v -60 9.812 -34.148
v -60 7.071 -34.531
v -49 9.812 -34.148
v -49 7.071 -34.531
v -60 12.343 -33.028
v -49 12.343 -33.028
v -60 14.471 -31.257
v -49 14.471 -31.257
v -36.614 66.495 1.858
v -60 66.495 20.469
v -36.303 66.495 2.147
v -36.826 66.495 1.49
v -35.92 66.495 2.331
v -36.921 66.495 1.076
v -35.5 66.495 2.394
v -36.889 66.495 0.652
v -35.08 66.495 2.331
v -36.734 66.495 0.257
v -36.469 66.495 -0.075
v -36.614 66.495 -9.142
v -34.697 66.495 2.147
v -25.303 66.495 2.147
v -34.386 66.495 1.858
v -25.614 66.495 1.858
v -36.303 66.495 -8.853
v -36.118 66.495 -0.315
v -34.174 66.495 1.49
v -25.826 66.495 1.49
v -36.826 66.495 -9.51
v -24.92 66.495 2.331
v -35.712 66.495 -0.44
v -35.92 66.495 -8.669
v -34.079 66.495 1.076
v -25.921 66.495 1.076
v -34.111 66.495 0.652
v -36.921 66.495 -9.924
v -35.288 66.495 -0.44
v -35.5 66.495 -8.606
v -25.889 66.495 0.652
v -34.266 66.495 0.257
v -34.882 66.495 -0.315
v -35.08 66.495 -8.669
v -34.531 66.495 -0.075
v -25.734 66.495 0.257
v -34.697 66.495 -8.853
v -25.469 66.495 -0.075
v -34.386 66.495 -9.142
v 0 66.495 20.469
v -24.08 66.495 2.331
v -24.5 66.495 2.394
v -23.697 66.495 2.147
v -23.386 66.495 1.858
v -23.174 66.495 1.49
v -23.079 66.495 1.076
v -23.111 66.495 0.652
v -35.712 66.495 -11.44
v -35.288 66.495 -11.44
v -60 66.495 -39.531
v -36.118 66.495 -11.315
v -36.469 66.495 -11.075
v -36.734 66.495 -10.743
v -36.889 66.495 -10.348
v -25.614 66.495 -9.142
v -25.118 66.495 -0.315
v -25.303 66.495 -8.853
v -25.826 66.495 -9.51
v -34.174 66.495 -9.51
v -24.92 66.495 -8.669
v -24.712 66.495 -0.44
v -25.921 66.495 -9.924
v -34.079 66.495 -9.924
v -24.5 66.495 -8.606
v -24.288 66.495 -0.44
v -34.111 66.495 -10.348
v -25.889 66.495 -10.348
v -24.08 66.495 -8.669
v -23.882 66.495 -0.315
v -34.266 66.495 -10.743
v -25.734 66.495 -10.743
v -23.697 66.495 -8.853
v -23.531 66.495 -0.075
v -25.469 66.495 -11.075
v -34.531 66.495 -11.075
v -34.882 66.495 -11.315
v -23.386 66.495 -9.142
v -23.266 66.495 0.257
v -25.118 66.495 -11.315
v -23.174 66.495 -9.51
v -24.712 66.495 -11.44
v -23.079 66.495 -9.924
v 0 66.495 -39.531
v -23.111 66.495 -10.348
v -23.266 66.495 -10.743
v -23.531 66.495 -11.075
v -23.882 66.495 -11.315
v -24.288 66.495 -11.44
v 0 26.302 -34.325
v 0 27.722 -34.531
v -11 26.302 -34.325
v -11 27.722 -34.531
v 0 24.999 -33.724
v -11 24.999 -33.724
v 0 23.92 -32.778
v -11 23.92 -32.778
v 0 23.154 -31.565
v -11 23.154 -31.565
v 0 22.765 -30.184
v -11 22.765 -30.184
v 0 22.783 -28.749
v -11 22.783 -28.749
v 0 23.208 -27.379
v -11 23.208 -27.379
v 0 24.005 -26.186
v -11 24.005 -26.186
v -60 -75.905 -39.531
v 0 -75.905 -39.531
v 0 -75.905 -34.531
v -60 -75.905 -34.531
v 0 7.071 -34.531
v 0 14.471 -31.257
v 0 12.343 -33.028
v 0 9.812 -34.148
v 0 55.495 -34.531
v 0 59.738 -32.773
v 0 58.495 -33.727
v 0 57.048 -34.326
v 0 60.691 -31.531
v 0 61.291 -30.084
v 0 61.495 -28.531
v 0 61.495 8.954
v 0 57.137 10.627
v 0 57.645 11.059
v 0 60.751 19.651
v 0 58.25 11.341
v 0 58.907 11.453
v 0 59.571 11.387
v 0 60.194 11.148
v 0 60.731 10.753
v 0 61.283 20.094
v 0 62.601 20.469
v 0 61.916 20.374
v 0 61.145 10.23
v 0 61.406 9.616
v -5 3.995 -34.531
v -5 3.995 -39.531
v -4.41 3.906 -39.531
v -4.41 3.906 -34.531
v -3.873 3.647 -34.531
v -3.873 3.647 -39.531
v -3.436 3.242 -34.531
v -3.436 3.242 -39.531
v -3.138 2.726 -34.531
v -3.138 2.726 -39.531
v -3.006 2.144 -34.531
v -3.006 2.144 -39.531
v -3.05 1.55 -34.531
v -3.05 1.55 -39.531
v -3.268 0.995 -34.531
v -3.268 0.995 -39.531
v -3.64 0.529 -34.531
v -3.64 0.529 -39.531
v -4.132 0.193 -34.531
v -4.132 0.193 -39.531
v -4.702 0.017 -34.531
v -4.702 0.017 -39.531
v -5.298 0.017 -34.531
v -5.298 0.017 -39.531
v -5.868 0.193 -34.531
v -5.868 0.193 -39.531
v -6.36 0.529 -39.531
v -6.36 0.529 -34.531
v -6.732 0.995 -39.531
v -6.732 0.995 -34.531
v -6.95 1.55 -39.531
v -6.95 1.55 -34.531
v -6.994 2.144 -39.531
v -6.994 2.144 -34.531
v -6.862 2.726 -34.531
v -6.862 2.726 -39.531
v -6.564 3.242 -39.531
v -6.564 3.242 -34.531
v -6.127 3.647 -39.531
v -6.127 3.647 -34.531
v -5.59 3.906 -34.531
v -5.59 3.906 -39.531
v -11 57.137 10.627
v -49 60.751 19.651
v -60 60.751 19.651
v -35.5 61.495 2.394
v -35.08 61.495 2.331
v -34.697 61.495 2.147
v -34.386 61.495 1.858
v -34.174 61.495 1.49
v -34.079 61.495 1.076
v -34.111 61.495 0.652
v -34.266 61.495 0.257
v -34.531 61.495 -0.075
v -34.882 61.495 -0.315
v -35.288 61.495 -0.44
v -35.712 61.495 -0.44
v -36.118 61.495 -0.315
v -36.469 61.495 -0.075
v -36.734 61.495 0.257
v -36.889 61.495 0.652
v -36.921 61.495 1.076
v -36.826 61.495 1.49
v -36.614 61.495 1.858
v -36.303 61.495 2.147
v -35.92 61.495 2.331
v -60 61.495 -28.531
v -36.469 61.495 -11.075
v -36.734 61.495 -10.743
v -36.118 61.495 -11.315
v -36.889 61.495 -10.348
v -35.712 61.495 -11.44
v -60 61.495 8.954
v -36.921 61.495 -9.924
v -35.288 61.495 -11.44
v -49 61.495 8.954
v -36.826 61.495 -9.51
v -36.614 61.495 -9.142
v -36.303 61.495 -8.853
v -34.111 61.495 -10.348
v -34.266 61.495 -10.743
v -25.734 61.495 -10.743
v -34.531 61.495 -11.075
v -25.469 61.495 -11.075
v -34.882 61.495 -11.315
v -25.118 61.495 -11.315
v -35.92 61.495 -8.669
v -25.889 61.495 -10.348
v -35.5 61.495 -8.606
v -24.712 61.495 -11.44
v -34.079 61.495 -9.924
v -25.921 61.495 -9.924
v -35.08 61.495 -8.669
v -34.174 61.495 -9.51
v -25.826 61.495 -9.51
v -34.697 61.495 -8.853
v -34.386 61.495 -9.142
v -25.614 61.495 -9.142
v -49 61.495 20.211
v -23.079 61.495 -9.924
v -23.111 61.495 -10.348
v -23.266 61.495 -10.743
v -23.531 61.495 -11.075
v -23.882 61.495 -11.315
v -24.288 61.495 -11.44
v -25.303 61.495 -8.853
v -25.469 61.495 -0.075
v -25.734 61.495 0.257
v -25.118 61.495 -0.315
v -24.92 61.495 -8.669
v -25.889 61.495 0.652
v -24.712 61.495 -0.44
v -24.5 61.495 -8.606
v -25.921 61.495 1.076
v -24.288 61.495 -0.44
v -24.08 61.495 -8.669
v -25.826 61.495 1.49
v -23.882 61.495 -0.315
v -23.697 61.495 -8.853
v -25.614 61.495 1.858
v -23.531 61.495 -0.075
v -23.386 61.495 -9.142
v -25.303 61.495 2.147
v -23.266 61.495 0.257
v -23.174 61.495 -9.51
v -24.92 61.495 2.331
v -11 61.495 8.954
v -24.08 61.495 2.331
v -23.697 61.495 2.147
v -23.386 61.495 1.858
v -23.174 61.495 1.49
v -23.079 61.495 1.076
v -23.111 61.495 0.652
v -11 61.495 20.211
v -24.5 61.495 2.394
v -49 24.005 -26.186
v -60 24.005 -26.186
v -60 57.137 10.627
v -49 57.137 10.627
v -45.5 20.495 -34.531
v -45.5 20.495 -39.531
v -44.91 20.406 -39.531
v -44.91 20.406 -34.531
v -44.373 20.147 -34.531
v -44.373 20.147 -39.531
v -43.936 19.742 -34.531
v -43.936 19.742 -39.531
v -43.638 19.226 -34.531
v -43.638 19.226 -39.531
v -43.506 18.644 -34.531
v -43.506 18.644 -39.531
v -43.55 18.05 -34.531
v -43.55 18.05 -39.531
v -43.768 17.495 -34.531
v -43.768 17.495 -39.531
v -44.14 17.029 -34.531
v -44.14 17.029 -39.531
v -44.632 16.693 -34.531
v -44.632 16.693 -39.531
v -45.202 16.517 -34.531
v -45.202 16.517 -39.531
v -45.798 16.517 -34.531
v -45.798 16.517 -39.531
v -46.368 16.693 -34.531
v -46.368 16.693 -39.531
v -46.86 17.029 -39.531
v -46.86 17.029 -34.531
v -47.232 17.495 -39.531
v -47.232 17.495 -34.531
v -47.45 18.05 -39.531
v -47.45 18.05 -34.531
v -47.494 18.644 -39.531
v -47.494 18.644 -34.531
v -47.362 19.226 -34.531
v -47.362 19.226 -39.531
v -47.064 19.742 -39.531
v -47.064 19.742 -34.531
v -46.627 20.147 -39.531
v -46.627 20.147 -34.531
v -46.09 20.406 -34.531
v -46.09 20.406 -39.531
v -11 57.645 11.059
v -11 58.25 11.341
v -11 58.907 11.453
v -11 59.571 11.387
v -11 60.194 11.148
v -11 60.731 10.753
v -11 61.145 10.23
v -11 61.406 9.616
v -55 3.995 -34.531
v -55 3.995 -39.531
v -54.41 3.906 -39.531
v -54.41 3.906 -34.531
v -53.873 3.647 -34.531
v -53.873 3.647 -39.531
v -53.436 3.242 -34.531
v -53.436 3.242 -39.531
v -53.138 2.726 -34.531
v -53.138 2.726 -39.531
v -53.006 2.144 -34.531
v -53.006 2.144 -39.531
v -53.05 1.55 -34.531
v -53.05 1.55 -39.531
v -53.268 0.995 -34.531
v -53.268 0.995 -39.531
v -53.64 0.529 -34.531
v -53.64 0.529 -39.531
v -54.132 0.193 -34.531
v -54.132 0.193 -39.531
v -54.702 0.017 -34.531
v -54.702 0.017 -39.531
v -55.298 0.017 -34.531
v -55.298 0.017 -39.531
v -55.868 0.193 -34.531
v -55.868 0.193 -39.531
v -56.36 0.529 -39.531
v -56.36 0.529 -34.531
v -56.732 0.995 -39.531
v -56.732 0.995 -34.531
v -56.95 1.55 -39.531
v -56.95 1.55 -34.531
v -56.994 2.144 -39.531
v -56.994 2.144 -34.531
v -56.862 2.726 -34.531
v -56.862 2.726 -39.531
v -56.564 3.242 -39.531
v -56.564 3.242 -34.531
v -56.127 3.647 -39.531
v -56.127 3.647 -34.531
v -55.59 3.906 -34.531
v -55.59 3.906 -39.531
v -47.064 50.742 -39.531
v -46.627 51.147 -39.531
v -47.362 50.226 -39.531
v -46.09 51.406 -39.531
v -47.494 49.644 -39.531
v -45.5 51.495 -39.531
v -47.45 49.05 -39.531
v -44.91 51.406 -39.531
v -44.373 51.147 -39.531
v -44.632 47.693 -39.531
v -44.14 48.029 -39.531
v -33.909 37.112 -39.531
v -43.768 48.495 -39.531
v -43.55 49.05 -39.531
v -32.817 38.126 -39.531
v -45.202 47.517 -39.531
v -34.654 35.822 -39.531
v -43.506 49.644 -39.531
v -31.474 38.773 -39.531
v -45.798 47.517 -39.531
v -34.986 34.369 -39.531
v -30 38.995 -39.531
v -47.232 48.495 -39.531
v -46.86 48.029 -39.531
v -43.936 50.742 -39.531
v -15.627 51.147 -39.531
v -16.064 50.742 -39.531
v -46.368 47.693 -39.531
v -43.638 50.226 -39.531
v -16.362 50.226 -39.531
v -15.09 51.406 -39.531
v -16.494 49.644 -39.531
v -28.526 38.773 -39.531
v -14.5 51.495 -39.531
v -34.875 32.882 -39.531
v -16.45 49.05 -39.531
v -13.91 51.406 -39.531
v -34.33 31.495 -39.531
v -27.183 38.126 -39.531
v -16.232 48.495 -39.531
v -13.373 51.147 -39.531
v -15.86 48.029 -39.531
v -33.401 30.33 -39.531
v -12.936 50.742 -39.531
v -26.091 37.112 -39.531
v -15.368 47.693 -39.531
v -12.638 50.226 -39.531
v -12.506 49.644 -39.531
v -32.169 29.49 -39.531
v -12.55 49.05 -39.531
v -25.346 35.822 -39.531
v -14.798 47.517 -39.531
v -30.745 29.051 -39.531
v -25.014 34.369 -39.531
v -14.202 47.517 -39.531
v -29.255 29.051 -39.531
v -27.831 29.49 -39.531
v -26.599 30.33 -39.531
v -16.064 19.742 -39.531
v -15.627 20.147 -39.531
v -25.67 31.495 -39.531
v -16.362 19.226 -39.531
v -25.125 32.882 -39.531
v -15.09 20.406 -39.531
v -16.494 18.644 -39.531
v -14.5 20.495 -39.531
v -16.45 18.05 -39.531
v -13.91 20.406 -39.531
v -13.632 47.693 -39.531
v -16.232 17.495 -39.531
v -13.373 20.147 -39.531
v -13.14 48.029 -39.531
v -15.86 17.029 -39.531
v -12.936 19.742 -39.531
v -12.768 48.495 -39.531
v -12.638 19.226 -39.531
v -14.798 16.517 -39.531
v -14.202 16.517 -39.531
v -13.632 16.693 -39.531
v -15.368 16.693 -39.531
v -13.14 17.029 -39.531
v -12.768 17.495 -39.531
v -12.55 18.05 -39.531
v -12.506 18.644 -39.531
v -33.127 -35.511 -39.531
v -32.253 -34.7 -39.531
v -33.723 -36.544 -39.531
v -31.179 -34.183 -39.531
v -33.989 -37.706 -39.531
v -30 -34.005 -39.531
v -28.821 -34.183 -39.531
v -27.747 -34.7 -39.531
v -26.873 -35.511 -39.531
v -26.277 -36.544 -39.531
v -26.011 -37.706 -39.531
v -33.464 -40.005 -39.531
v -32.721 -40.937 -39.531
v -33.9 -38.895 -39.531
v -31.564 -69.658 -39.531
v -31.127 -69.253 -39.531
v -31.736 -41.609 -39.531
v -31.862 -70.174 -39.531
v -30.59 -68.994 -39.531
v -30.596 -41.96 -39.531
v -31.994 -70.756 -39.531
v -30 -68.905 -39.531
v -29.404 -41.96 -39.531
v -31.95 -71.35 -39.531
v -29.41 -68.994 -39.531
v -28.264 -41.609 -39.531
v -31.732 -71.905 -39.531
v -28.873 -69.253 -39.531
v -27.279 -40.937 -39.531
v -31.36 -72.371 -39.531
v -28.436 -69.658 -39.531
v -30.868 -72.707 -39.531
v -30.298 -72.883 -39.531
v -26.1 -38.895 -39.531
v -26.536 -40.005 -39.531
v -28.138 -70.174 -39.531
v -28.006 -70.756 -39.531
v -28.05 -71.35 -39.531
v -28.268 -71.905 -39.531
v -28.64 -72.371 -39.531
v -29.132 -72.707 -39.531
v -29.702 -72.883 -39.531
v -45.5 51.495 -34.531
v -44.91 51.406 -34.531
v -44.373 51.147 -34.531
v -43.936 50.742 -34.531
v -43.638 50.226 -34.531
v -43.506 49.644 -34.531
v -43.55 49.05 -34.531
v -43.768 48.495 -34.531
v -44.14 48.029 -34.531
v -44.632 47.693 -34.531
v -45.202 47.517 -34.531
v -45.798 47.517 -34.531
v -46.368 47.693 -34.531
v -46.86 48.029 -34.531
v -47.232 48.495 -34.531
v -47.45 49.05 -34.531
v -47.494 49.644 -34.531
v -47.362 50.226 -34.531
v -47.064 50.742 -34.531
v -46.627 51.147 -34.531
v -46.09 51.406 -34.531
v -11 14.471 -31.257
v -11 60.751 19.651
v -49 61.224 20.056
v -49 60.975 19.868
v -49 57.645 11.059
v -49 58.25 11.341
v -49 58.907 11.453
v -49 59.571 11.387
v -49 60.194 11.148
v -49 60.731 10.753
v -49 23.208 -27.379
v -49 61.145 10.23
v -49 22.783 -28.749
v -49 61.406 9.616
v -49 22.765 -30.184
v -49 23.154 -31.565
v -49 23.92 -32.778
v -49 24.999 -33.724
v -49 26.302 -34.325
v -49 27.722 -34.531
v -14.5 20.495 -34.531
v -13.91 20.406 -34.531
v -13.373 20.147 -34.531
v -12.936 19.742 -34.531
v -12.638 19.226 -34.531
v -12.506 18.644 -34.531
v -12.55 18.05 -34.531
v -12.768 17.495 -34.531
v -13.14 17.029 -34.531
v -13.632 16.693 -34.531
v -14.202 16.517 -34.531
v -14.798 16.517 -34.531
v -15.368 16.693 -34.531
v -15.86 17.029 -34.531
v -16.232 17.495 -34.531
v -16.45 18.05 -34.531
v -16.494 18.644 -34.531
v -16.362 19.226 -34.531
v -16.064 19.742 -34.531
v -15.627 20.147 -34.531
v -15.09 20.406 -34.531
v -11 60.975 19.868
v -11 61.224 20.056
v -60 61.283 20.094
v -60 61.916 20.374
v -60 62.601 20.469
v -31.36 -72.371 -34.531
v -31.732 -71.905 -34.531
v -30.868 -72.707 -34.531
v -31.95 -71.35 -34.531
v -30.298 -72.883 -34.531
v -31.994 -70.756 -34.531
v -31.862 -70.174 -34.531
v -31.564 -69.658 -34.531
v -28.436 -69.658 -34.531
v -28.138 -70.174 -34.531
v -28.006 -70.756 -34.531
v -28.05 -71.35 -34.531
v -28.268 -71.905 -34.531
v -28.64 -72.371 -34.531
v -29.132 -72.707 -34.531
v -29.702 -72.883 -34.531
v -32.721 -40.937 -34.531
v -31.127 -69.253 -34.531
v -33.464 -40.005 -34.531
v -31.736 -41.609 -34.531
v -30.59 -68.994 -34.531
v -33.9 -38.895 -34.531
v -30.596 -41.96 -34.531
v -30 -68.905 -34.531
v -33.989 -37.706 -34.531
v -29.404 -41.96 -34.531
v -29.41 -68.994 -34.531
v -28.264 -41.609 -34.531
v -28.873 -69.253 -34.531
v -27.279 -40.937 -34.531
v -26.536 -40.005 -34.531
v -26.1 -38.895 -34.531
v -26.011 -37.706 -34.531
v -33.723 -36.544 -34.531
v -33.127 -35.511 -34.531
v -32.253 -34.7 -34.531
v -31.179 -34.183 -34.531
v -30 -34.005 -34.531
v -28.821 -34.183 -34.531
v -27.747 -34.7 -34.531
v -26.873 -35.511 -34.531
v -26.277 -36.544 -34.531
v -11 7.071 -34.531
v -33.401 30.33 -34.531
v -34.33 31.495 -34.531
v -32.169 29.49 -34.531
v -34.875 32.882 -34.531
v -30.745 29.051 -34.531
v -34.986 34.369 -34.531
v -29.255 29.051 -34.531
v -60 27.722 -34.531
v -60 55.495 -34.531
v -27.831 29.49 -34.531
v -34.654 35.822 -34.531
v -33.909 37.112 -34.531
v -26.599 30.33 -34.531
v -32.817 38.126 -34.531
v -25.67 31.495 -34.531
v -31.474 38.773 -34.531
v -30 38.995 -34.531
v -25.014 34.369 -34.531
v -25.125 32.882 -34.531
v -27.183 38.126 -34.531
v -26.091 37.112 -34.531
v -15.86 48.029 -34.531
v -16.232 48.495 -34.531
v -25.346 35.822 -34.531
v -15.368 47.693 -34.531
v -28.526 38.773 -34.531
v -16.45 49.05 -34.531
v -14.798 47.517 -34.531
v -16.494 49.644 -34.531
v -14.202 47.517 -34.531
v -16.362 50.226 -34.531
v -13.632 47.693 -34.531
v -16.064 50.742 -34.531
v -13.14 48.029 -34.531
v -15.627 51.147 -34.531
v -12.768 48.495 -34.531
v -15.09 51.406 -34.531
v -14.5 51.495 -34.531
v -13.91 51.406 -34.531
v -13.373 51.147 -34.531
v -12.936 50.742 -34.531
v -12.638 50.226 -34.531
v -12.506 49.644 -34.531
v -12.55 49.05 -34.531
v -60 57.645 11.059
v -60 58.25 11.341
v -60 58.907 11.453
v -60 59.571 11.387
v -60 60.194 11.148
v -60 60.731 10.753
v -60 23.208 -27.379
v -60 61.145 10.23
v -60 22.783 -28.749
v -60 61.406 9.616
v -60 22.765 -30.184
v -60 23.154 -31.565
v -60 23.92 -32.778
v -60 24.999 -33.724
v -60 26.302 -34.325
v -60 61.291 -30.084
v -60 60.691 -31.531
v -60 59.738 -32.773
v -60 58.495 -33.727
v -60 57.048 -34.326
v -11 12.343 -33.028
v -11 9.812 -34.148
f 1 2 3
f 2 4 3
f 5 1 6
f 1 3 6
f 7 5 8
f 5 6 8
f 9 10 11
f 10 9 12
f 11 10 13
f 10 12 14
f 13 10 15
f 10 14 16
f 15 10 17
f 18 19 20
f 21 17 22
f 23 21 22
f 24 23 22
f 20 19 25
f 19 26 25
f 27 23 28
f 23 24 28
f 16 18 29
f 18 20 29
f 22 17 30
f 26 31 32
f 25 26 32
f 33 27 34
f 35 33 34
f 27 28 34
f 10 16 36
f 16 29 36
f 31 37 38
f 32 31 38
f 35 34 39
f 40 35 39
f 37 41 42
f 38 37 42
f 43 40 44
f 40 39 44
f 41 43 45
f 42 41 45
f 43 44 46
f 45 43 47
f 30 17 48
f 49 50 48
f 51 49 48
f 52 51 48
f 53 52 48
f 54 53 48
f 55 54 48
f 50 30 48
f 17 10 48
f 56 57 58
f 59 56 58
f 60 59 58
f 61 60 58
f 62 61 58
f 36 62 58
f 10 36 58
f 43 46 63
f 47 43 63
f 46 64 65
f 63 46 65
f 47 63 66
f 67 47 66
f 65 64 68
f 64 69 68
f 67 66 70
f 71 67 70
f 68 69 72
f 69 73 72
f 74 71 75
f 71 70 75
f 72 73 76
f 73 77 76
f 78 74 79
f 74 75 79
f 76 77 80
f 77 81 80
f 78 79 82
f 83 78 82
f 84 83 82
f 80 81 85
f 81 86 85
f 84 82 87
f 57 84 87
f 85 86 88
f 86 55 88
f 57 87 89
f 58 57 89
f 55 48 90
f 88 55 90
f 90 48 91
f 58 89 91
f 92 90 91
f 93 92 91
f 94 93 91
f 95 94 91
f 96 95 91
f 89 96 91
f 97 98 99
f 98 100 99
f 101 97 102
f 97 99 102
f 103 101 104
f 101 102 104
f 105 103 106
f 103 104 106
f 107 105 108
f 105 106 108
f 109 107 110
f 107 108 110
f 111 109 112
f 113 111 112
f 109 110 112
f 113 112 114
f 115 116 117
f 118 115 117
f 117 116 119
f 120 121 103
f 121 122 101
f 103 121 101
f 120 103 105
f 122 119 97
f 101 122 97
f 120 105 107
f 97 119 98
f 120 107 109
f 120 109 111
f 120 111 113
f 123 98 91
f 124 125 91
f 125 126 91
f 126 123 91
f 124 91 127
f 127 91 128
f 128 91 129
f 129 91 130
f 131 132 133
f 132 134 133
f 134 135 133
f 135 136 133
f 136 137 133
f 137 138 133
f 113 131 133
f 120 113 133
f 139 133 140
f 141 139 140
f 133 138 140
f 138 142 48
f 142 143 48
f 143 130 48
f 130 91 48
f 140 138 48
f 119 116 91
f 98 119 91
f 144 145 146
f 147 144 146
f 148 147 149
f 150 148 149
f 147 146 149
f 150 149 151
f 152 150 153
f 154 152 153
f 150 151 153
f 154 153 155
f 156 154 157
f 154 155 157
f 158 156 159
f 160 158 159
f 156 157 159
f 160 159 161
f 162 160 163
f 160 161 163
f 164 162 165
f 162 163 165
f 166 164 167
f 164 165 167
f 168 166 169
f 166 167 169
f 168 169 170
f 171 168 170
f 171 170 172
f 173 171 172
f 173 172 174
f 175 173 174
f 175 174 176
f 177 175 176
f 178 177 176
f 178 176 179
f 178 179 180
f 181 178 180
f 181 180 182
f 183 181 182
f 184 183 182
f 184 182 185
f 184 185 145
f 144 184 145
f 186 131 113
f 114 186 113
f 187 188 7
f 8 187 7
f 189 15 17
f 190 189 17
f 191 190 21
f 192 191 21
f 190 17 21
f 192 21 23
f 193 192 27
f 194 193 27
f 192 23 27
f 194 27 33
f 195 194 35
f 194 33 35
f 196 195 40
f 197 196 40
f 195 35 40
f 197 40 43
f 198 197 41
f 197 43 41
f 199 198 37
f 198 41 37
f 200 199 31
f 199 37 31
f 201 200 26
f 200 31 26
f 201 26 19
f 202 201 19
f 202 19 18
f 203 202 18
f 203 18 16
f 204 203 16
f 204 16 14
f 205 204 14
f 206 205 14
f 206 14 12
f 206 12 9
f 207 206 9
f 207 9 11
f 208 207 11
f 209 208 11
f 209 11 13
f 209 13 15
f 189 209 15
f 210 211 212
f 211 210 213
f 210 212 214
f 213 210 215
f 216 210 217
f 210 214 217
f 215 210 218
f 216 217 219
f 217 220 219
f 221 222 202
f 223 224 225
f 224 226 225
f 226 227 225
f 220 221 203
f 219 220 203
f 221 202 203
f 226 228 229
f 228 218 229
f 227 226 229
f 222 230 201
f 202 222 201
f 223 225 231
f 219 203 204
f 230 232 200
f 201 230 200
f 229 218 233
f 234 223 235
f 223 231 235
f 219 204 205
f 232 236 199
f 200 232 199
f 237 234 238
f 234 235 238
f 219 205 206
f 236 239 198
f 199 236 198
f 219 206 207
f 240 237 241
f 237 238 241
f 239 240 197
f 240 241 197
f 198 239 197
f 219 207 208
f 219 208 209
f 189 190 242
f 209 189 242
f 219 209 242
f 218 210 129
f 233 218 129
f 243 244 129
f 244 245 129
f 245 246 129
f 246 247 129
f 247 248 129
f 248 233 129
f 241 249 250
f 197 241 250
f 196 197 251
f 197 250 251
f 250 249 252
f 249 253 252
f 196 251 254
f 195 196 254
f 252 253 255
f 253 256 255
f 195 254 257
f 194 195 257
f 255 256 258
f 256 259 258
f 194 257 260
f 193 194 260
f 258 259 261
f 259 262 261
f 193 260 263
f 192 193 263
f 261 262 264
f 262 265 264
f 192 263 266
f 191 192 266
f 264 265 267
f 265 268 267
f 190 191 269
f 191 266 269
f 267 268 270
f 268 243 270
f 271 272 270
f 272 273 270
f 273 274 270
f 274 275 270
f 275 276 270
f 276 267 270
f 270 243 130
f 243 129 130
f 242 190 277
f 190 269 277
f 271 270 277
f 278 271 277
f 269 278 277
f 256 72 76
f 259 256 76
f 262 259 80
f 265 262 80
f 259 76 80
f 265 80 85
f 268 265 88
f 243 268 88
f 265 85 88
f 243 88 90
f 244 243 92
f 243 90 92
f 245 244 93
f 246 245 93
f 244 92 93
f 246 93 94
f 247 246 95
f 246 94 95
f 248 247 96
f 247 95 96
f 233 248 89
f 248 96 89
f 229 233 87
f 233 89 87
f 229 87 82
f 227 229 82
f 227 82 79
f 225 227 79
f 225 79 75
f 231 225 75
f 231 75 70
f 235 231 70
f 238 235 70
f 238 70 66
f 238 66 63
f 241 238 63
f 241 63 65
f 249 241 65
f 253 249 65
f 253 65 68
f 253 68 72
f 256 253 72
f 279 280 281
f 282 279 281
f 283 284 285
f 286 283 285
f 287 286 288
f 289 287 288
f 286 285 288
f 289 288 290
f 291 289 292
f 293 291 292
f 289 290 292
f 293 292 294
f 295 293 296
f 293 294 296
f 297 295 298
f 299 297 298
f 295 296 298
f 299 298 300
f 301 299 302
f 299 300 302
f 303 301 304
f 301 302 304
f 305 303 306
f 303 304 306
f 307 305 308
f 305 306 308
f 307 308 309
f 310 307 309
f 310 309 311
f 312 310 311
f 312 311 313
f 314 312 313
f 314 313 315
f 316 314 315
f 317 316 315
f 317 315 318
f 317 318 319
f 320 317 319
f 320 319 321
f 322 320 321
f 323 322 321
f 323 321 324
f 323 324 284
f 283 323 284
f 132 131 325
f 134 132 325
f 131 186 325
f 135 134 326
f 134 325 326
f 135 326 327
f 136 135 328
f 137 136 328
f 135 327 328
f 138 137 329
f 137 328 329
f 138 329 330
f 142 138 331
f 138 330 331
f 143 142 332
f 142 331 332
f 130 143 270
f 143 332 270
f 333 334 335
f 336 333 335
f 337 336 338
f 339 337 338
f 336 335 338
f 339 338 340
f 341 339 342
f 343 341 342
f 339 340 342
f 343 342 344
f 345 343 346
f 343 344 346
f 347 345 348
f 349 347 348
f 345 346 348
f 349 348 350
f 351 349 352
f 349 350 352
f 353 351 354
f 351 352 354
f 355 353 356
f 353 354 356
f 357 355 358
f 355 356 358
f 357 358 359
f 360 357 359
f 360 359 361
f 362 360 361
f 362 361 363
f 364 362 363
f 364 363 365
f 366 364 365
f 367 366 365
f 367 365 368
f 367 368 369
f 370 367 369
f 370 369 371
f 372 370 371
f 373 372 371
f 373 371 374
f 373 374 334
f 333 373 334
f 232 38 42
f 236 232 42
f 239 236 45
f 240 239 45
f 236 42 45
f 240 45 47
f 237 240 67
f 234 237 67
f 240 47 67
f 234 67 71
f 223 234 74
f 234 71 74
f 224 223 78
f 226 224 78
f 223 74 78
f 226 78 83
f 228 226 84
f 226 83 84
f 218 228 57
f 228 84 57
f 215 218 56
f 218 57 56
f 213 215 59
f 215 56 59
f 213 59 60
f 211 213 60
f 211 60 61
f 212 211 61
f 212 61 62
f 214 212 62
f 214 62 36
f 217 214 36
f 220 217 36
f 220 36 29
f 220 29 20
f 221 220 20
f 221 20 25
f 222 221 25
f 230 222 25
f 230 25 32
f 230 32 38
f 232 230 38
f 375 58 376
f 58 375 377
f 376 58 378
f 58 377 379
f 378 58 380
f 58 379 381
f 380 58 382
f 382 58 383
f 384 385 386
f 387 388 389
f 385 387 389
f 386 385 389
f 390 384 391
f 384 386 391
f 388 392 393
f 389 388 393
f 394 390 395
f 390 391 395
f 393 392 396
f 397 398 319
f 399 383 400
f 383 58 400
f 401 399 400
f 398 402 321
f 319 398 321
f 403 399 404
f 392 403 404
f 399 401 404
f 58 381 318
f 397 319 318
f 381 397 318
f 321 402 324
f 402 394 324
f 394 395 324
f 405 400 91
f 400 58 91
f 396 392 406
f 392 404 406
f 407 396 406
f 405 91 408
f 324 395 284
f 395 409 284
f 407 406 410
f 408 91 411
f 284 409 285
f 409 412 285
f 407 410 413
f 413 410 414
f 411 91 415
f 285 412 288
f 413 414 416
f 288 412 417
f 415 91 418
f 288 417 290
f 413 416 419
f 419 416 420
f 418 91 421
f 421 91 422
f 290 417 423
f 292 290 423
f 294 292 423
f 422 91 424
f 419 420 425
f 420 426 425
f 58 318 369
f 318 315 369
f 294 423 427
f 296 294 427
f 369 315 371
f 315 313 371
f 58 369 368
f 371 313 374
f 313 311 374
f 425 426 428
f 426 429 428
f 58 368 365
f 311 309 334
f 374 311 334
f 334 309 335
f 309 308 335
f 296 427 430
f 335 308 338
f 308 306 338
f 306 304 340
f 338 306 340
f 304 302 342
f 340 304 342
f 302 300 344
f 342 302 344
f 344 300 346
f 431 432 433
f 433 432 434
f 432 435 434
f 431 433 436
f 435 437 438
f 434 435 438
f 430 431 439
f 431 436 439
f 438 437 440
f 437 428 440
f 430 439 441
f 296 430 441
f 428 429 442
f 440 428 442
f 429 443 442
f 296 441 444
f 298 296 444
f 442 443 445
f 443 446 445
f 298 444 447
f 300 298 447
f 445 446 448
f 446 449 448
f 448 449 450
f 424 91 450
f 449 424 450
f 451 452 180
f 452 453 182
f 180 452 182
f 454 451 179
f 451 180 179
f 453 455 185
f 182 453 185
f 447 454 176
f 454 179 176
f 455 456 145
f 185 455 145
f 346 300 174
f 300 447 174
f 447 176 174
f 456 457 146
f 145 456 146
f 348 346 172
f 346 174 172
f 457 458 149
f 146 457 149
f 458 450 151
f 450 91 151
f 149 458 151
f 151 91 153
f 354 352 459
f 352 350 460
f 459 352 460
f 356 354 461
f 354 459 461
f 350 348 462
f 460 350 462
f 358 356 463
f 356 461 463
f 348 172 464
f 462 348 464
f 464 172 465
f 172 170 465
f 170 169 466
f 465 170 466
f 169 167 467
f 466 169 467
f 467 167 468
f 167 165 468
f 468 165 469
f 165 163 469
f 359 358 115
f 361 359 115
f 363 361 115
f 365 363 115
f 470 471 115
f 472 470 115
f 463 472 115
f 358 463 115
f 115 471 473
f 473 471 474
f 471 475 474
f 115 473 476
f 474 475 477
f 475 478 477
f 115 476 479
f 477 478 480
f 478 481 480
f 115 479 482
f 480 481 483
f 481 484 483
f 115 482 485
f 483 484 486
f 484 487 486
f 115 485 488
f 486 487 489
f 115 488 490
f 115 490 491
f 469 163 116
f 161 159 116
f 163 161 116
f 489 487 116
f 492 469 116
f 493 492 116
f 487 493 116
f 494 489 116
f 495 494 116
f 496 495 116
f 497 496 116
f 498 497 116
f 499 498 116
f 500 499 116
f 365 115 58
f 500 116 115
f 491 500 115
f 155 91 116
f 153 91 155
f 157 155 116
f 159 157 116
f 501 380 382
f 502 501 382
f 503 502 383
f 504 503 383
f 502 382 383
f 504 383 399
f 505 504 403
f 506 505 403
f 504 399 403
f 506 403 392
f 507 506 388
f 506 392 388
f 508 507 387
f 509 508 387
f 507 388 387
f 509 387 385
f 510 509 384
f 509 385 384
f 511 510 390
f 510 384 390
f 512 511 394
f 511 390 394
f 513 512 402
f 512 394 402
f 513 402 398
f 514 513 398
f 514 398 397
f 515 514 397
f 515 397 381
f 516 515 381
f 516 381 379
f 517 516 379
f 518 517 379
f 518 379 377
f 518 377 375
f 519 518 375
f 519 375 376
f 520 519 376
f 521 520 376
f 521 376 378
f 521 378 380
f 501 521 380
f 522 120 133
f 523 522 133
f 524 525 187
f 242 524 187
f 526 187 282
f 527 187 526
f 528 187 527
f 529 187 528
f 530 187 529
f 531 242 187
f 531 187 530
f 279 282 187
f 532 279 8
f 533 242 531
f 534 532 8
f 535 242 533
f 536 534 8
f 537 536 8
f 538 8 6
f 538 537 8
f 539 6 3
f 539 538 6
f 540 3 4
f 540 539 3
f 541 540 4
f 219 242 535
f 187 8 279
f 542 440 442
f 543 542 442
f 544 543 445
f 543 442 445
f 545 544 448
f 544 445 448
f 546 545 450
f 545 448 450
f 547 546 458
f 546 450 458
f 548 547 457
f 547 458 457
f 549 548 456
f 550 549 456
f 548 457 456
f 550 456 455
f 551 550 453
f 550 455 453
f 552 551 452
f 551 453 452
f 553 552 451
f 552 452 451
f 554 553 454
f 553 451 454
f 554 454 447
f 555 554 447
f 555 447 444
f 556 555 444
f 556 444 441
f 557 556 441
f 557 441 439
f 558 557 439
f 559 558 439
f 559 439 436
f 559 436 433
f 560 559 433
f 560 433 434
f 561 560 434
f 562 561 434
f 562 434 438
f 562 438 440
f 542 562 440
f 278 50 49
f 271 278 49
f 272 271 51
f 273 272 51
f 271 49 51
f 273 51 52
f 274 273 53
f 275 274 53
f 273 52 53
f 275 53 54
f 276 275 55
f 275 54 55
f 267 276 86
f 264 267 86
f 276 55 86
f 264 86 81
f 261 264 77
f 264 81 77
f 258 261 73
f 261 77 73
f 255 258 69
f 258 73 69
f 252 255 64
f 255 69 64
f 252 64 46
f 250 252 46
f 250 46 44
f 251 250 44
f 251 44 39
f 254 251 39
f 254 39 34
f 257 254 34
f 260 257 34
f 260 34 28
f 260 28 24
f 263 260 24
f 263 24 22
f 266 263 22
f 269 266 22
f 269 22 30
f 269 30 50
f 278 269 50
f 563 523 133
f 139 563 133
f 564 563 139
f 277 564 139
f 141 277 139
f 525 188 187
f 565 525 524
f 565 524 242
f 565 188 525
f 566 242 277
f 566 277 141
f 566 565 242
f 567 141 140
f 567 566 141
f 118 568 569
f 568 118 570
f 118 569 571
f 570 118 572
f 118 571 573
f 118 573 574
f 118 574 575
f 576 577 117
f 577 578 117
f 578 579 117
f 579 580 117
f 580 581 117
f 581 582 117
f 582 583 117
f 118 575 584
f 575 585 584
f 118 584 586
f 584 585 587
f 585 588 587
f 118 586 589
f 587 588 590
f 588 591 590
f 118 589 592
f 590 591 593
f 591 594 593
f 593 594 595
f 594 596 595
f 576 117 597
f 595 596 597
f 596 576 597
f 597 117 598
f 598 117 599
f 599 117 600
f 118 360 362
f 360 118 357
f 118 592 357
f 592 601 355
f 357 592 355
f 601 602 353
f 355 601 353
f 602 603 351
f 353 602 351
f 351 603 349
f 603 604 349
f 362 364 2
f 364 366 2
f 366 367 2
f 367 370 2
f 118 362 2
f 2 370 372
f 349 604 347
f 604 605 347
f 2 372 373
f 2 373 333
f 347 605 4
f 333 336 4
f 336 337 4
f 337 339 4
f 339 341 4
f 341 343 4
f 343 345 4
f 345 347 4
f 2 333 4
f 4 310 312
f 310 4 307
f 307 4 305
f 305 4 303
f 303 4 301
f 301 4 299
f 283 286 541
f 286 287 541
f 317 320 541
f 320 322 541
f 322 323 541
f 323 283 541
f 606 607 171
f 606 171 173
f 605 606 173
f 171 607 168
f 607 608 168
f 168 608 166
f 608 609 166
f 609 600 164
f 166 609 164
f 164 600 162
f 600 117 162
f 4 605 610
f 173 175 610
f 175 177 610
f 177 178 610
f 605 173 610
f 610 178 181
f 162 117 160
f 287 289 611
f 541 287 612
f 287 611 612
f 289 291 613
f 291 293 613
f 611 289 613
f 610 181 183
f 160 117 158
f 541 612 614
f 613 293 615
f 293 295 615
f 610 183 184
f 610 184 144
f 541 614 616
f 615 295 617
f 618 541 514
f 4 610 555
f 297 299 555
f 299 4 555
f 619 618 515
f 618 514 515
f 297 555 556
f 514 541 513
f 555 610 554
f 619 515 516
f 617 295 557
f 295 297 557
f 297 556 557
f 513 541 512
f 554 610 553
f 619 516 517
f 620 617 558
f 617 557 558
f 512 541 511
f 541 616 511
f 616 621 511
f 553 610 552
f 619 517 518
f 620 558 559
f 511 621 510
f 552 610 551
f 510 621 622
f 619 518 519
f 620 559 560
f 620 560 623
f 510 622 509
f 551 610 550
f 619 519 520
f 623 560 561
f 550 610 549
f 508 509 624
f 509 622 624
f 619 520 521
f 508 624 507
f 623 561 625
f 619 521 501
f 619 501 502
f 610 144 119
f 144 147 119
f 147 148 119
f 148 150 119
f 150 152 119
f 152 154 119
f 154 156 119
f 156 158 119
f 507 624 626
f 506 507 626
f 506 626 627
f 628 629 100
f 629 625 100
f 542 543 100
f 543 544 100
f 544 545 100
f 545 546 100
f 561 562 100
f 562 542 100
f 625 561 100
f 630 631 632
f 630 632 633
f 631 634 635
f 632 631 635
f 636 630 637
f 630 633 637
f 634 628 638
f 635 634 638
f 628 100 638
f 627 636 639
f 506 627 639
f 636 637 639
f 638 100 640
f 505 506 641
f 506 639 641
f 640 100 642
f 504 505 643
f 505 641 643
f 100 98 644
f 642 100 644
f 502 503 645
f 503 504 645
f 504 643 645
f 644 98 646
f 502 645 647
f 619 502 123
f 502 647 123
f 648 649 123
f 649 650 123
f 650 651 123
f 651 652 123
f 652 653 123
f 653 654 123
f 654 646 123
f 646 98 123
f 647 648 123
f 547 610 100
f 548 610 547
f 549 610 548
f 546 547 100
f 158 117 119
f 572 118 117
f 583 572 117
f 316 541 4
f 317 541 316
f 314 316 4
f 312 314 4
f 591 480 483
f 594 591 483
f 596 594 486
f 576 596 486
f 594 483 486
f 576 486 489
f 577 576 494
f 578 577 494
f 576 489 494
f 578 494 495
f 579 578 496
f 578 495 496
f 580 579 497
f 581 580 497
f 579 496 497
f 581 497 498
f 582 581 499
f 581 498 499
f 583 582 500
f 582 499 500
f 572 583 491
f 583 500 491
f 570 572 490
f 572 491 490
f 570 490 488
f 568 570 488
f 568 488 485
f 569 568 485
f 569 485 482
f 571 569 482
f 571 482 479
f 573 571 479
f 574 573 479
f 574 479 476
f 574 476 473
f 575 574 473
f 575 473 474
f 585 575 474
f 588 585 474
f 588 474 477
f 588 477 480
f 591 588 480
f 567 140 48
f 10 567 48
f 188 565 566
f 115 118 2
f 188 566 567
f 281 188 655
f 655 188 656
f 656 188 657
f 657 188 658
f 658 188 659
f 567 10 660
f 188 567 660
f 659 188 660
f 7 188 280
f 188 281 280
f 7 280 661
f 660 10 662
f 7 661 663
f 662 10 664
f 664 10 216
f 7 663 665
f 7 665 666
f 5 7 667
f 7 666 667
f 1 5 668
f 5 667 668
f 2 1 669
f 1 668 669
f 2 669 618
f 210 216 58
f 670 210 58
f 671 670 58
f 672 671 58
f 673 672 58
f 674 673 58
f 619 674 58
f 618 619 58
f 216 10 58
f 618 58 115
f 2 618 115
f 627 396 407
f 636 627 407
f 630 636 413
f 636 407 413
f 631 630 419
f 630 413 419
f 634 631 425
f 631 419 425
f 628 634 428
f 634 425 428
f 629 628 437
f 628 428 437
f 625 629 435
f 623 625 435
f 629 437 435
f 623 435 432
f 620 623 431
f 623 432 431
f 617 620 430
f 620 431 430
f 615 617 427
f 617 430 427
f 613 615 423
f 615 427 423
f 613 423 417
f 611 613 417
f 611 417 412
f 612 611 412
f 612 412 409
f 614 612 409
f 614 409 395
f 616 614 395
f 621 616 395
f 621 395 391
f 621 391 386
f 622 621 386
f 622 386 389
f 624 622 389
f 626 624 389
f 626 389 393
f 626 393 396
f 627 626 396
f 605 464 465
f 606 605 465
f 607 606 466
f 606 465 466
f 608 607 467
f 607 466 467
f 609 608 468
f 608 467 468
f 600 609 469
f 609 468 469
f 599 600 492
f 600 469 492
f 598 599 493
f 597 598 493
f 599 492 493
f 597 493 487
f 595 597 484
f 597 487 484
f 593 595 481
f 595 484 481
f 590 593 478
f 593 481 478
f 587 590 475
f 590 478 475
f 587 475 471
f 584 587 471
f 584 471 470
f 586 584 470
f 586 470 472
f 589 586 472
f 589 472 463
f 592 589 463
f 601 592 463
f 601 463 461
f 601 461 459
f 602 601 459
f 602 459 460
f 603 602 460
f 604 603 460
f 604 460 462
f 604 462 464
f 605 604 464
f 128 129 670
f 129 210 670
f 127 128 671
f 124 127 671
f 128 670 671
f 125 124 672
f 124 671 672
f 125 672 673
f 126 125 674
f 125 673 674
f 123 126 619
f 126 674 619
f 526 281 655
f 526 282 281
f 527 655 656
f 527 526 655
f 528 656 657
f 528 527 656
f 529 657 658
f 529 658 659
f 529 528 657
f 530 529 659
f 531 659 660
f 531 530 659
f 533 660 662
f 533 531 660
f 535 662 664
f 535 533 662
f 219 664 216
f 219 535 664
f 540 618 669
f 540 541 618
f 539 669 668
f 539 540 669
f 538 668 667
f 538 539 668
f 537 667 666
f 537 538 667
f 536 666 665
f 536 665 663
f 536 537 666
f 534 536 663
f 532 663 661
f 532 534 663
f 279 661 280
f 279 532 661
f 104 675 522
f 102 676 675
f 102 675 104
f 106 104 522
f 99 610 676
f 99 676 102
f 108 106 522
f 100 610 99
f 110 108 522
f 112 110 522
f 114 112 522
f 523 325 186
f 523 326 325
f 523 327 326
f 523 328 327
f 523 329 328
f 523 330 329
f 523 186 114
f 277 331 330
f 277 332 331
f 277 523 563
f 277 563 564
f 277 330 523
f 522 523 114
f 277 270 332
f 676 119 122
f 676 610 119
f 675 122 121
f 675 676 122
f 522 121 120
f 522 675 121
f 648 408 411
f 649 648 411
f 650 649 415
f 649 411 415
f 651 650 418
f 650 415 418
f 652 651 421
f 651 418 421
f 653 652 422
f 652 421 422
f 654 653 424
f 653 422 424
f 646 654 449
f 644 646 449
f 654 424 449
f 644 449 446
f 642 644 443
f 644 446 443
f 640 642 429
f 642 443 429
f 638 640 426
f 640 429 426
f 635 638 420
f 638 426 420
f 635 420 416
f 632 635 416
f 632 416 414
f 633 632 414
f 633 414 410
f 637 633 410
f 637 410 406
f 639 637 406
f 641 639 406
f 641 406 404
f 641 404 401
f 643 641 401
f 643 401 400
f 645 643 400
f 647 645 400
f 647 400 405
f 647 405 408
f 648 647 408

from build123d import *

# Parameters (mm, degrees)
BOSS_EXTRUDE1_DEPTH = 60
CUT_EXTRUDE2_REACH  = 161.501
SKETCH2_R           = 1.425
CUT_EXTRUDE3_REACH  = 115.849
SKETCH10_R          = 5
SKETCH10_R_2        = 4
SKETCH10_R_3        = 2
BOSS_EXTRUDE2_DEPTH = 11
BOSS_EXTRUDE3_DEPTH = 11
FILLET2_R           = 10
FILLET3_R           = 10
FILLET4_R           = 5
FILLET5_R           = 5
FILLET6_R           = 2.5
FILLET7_R           = 2.5
FILLET8_START       = -61
FILLET8_DEPTH       = 62
FILLET9_R           = 6


with BuildPart() as part:
    # Sketch1 → Boss-Extrude1 (new body)
    with BuildSketch(Plane(origin=(0, 0, 0), x_dir=(0, 0, -1), z_dir=(1, 0, 0))):
        Polygon((-20.469264339, 61.494964584), (-20.469264339, 66.494964584), (39.530735661, 66.494964584), (39.530735661, -75.905035416), (34.530735661, -75.905035416), (34.530735661, 61.494964584), align=None)
    extrude(amount=-BOSS_EXTRUDE1_DEPTH)

    # Sketch2 → Cut-Extrude2 (cut, up to next)
    with BuildSketch(Plane(origin=(0, 66.494964584, 0), x_dir=(1, 0, 0), z_dir=(0, 1, 0)), mode=Mode.PRIVATE) as cut_extrude2_sk1:
        with Locations(Location((-35.5, 10.030735661, 0), (0, 0, 270))):
            Circle(SKETCH2_R)
    cut_extrude2_tool1 = extrude(cut_extrude2_sk1.sketch, amount=-CUT_EXTRUDE2_REACH, mode=Mode.PRIVATE) & part.part
    # Sketch2 → Cut-Extrude2 (cut, up to next)
    with BuildSketch(Plane(origin=(0, 66.494964584, 0), x_dir=(1, 0, 0), z_dir=(0, 1, 0)), mode=Mode.PRIVATE) as cut_extrude2_sk2:
        with Locations(Location((-24.5, 10.030735661, 0), (0, 0, 270))):
            Circle(SKETCH2_R)
    cut_extrude2_tool2 = extrude(cut_extrude2_sk2.sketch, amount=-CUT_EXTRUDE2_REACH, mode=Mode.PRIVATE) & part.part
    # Sketch2 → Cut-Extrude2 (cut, up to next)
    with BuildSketch(Plane(origin=(0, 66.494964584, 0), x_dir=(1, 0, 0), z_dir=(0, 1, 0)), mode=Mode.PRIVATE) as cut_extrude2_sk3:
        with Locations(Location((-24.5, -0.969264339, 0), (0, 0, 270))):
            Circle(SKETCH2_R)
    cut_extrude2_tool3 = extrude(cut_extrude2_sk3.sketch, amount=-CUT_EXTRUDE2_REACH, mode=Mode.PRIVATE) & part.part
    # Sketch2 → Cut-Extrude2 (cut, up to next)
    with BuildSketch(Plane(origin=(0, 66.494964584, 0), x_dir=(1, 0, 0), z_dir=(0, 1, 0)), mode=Mode.PRIVATE) as cut_extrude2_sk4:
        with Locations(Location((-35.5, -0.969264339, 0), (0, 0, 270))):
            Circle(SKETCH2_R)
    cut_extrude2_tool4 = extrude(cut_extrude2_sk4.sketch, amount=-CUT_EXTRUDE2_REACH, mode=Mode.PRIVATE) & part.part
    add(cut_extrude2_tool1.solids().sort_by_distance((-35.5, 66.494965, -10.030736))[0], mode=Mode.SUBTRACT)
    add(cut_extrude2_tool2.solids().sort_by_distance((-24.5, 66.494965, -10.030736))[0], mode=Mode.SUBTRACT)
    add(cut_extrude2_tool3.solids().sort_by_distance((-24.5, 66.494965, 0.969264))[0], mode=Mode.SUBTRACT)
    add(cut_extrude2_tool4.solids().sort_by_distance((-35.5, 66.494965, 0.969264))[0], mode=Mode.SUBTRACT)

    # Sketch10 → Cut-Extrude3 (cut, up to next)
    with BuildSketch(Plane(origin=(0, 0, -39.530735661), x_dir=(-1, 0, 0), z_dir=(0, 0, -1)), mode=Mode.PRIVATE) as cut_extrude3_sk1:
        with Locations(Location((30, 33.994964584, 0), (0, 0, 90))):
            Circle(SKETCH10_R)
    cut_extrude3_tool1 = extrude(cut_extrude3_sk1.sketch, amount=-CUT_EXTRUDE3_REACH, mode=Mode.PRIVATE) & part.part
    # Sketch10 → Cut-Extrude3 (cut, up to next)
    with BuildSketch(Plane(origin=(0, 0, -39.530735661), x_dir=(-1, 0, 0), z_dir=(0, 0, -1)), mode=Mode.PRIVATE) as cut_extrude3_sk2:
        with Locations(Location((30, -38.005035416, 0), (0, 0, 90))):
            Circle(SKETCH10_R_2)
    cut_extrude3_tool2 = extrude(cut_extrude3_sk2.sketch, amount=-CUT_EXTRUDE3_REACH, mode=Mode.PRIVATE) & part.part
    # Sketch10 → Cut-Extrude3 (cut, up to next)
    with BuildSketch(Plane(origin=(0, 0, -39.530735661), x_dir=(-1, 0, 0), z_dir=(0, 0, -1)), mode=Mode.PRIVATE) as cut_extrude3_sk3:
        with Locations(Location((14.5, 49.494964584, 0), (0, 0, 90))):
            Circle(SKETCH10_R_3)
    cut_extrude3_tool3 = extrude(cut_extrude3_sk3.sketch, amount=-CUT_EXTRUDE3_REACH, mode=Mode.PRIVATE) & part.part
    # Sketch10 → Cut-Extrude3 (cut, up to next)
    with BuildSketch(Plane(origin=(0, 0, -39.530735661), x_dir=(-1, 0, 0), z_dir=(0, 0, -1)), mode=Mode.PRIVATE) as cut_extrude3_sk4:
        with Locations(Location((14.5, 18.494964584, 0), (0, 0, 90))):
            Circle(SKETCH10_R_3)
    cut_extrude3_tool4 = extrude(cut_extrude3_sk4.sketch, amount=-CUT_EXTRUDE3_REACH, mode=Mode.PRIVATE) & part.part
    # Sketch10 → Cut-Extrude3 (cut, up to next)
    with BuildSketch(Plane(origin=(0, 0, -39.530735661), x_dir=(-1, 0, 0), z_dir=(0, 0, -1)), mode=Mode.PRIVATE) as cut_extrude3_sk5:
        with Locations(Location((45.5, 18.494964584, 0), (0, 0, 90))):
            Circle(SKETCH10_R_3)
    cut_extrude3_tool5 = extrude(cut_extrude3_sk5.sketch, amount=-CUT_EXTRUDE3_REACH, mode=Mode.PRIVATE) & part.part
    # Sketch10 → Cut-Extrude3 (cut, up to next)
    with BuildSketch(Plane(origin=(0, 0, -39.530735661), x_dir=(-1, 0, 0), z_dir=(0, 0, -1)), mode=Mode.PRIVATE) as cut_extrude3_sk6:
        with Locations(Location((45.5, 49.494964584, 0), (0, 0, 90))):
            Circle(SKETCH10_R_3)
    cut_extrude3_tool6 = extrude(cut_extrude3_sk6.sketch, amount=-CUT_EXTRUDE3_REACH, mode=Mode.PRIVATE) & part.part
    # Sketch10 → Cut-Extrude3 (cut, up to next)
    with BuildSketch(Plane(origin=(0, 0, -39.530735661), x_dir=(-1, 0, 0), z_dir=(0, 0, -1)), mode=Mode.PRIVATE) as cut_extrude3_sk7:
        with Locations(Location((5, 1.994964584, 0), (0, 0, 90))):
            Circle(SKETCH10_R_3)
    cut_extrude3_tool7 = extrude(cut_extrude3_sk7.sketch, amount=-CUT_EXTRUDE3_REACH, mode=Mode.PRIVATE) & part.part
    # Sketch10 → Cut-Extrude3 (cut, up to next)
    with BuildSketch(Plane(origin=(0, 0, -39.530735661), x_dir=(-1, 0, 0), z_dir=(0, 0, -1)), mode=Mode.PRIVATE) as cut_extrude3_sk8:
        with Locations(Location((55, 1.994964584, 0), (0, 0, 90))):
            Circle(SKETCH10_R_3)
    cut_extrude3_tool8 = extrude(cut_extrude3_sk8.sketch, amount=-CUT_EXTRUDE3_REACH, mode=Mode.PRIVATE) & part.part
    # Sketch10 → Cut-Extrude3 (cut, up to next)
    with BuildSketch(Plane(origin=(0, 0, -39.530735661), x_dir=(-1, 0, 0), z_dir=(0, 0, -1)), mode=Mode.PRIVATE) as cut_extrude3_sk9:
        with Locations(Location((30, -70.905035416, 0), (0, 0, 90))):
            Circle(SKETCH10_R_3)
    cut_extrude3_tool9 = extrude(cut_extrude3_sk9.sketch, amount=-CUT_EXTRUDE3_REACH, mode=Mode.PRIVATE) & part.part
    add(cut_extrude3_tool1.solids().sort_by_distance((-30, 33.994965, -39.530736))[0], mode=Mode.SUBTRACT)
    add(cut_extrude3_tool2.solids().sort_by_distance((-30, -38.005035, -39.530736))[0], mode=Mode.SUBTRACT)
    add(cut_extrude3_tool3.solids().sort_by_distance((-14.5, 49.494965, -39.530736))[0], mode=Mode.SUBTRACT)
    add(cut_extrude3_tool4.solids().sort_by_distance((-14.5, 18.494965, -39.530736))[0], mode=Mode.SUBTRACT)
    add(cut_extrude3_tool5.solids().sort_by_distance((-45.5, 18.494965, -39.530736))[0], mode=Mode.SUBTRACT)
    add(cut_extrude3_tool6.solids().sort_by_distance((-45.5, 49.494965, -39.530736))[0], mode=Mode.SUBTRACT)
    add(cut_extrude3_tool7.solids().sort_by_distance((-5, 1.994965, -39.530736))[0], mode=Mode.SUBTRACT)
    add(cut_extrude3_tool8.solids().sort_by_distance((-55, 1.994965, -39.530736))[0], mode=Mode.SUBTRACT)
    add(cut_extrude3_tool9.solids().sort_by_distance((-30, -70.905035, -39.530736))[0], mode=Mode.SUBTRACT)

    # Sketch11 → Boss-Extrude2 (add)
    with BuildSketch(Plane(origin=(0, 0, 0), x_dir=(0, 0, -1), z_dir=(1, 0, 0))):
        Polygon((-15.469264339, 61.494964584), (34.530735661, 16.494964584), (34.530735661, 11.494964584), (-20.469264339, 61.494964584), align=None)
    extrude(amount=-BOSS_EXTRUDE2_DEPTH)

    # Sketch13 → Boss-Extrude3 (add)
    with BuildSketch(Plane.ZY.offset(60)):
        Polygon((-34.530735661, 11.494964584), (-34.530735661, 16.494964584), (15.469264339, 61.494964584), (20.469264339, 61.494964584), align=None)
    extrude(amount=-BOSS_EXTRUDE3_DEPTH)

    # Fillet2
    fillet2_edges = [part.edges().sort_by_distance(p)[0] for p in [
        (-54.5, 11.494964584, -34.530735661),
    ]]
    fillet(fillet2_edges, radius=FILLET2_R)

    # Fillet3
    fillet3_edges = [part.edges().sort_by_distance(p)[0] for p in [
        (-5.5, 11.494964584, -34.530735661),
    ]]
    fillet(fillet3_edges, radius=FILLET3_R)

    # Fillet4
    fillet4_edges = [part.edges().sort_by_distance(p)[0] for p in [
        (-5.5, 16.494964584, -34.530735661),
    ]]
    fillet(fillet4_edges, radius=FILLET4_R)

    # Fillet5
    fillet5_edges = [part.edges().sort_by_distance(p)[0] for p in [
        (-54.5, 16.494964584, -34.530735661),
    ]]
    fillet(fillet5_edges, radius=FILLET5_R)

    # Fillet6
    fillet6_edges = [part.edges().sort_by_distance(p)[0] for p in [
        (-54.5, 61.494964584, 15.469264339),
    ]]
    fillet(fillet6_edges, radius=FILLET6_R)

    # Fillet7
    fillet7_edges = [part.edges().sort_by_distance(p)[0] for p in [
        (-5.5, 61.494964584, 15.469264339),
    ]]
    fillet(fillet7_edges, radius=FILLET7_R)

    # Fillet8: read off the stored shape, not the designer's step
    # Fillet8 outline → Fillet8 (cut)
    with BuildSketch(Plane.YZ.offset(FILLET8_START)):
        with BuildLine():
            Line((61.494964584, 20.469264339), (60.751039115, 19.650946324))
            ThreePointArc((60.751039115, 19.650946324), (61.589505337, 20.255550078), (62.600889299, 20.469264339))
            Line((62.600889299, 20.469264339), (61.494964584, 20.469264339))
        make_face()
    extrude(amount=FILLET8_DEPTH, mode=Mode.SUBTRACT)

    # Fillet9
    fillet9_edges = [part.edges().sort_by_distance(p)[0] for p in [
        (-30, 61.494964584, -34.530735661),
    ]]
    fillet(fillet9_edges, radius=FILLET9_R)


solid = part.part
